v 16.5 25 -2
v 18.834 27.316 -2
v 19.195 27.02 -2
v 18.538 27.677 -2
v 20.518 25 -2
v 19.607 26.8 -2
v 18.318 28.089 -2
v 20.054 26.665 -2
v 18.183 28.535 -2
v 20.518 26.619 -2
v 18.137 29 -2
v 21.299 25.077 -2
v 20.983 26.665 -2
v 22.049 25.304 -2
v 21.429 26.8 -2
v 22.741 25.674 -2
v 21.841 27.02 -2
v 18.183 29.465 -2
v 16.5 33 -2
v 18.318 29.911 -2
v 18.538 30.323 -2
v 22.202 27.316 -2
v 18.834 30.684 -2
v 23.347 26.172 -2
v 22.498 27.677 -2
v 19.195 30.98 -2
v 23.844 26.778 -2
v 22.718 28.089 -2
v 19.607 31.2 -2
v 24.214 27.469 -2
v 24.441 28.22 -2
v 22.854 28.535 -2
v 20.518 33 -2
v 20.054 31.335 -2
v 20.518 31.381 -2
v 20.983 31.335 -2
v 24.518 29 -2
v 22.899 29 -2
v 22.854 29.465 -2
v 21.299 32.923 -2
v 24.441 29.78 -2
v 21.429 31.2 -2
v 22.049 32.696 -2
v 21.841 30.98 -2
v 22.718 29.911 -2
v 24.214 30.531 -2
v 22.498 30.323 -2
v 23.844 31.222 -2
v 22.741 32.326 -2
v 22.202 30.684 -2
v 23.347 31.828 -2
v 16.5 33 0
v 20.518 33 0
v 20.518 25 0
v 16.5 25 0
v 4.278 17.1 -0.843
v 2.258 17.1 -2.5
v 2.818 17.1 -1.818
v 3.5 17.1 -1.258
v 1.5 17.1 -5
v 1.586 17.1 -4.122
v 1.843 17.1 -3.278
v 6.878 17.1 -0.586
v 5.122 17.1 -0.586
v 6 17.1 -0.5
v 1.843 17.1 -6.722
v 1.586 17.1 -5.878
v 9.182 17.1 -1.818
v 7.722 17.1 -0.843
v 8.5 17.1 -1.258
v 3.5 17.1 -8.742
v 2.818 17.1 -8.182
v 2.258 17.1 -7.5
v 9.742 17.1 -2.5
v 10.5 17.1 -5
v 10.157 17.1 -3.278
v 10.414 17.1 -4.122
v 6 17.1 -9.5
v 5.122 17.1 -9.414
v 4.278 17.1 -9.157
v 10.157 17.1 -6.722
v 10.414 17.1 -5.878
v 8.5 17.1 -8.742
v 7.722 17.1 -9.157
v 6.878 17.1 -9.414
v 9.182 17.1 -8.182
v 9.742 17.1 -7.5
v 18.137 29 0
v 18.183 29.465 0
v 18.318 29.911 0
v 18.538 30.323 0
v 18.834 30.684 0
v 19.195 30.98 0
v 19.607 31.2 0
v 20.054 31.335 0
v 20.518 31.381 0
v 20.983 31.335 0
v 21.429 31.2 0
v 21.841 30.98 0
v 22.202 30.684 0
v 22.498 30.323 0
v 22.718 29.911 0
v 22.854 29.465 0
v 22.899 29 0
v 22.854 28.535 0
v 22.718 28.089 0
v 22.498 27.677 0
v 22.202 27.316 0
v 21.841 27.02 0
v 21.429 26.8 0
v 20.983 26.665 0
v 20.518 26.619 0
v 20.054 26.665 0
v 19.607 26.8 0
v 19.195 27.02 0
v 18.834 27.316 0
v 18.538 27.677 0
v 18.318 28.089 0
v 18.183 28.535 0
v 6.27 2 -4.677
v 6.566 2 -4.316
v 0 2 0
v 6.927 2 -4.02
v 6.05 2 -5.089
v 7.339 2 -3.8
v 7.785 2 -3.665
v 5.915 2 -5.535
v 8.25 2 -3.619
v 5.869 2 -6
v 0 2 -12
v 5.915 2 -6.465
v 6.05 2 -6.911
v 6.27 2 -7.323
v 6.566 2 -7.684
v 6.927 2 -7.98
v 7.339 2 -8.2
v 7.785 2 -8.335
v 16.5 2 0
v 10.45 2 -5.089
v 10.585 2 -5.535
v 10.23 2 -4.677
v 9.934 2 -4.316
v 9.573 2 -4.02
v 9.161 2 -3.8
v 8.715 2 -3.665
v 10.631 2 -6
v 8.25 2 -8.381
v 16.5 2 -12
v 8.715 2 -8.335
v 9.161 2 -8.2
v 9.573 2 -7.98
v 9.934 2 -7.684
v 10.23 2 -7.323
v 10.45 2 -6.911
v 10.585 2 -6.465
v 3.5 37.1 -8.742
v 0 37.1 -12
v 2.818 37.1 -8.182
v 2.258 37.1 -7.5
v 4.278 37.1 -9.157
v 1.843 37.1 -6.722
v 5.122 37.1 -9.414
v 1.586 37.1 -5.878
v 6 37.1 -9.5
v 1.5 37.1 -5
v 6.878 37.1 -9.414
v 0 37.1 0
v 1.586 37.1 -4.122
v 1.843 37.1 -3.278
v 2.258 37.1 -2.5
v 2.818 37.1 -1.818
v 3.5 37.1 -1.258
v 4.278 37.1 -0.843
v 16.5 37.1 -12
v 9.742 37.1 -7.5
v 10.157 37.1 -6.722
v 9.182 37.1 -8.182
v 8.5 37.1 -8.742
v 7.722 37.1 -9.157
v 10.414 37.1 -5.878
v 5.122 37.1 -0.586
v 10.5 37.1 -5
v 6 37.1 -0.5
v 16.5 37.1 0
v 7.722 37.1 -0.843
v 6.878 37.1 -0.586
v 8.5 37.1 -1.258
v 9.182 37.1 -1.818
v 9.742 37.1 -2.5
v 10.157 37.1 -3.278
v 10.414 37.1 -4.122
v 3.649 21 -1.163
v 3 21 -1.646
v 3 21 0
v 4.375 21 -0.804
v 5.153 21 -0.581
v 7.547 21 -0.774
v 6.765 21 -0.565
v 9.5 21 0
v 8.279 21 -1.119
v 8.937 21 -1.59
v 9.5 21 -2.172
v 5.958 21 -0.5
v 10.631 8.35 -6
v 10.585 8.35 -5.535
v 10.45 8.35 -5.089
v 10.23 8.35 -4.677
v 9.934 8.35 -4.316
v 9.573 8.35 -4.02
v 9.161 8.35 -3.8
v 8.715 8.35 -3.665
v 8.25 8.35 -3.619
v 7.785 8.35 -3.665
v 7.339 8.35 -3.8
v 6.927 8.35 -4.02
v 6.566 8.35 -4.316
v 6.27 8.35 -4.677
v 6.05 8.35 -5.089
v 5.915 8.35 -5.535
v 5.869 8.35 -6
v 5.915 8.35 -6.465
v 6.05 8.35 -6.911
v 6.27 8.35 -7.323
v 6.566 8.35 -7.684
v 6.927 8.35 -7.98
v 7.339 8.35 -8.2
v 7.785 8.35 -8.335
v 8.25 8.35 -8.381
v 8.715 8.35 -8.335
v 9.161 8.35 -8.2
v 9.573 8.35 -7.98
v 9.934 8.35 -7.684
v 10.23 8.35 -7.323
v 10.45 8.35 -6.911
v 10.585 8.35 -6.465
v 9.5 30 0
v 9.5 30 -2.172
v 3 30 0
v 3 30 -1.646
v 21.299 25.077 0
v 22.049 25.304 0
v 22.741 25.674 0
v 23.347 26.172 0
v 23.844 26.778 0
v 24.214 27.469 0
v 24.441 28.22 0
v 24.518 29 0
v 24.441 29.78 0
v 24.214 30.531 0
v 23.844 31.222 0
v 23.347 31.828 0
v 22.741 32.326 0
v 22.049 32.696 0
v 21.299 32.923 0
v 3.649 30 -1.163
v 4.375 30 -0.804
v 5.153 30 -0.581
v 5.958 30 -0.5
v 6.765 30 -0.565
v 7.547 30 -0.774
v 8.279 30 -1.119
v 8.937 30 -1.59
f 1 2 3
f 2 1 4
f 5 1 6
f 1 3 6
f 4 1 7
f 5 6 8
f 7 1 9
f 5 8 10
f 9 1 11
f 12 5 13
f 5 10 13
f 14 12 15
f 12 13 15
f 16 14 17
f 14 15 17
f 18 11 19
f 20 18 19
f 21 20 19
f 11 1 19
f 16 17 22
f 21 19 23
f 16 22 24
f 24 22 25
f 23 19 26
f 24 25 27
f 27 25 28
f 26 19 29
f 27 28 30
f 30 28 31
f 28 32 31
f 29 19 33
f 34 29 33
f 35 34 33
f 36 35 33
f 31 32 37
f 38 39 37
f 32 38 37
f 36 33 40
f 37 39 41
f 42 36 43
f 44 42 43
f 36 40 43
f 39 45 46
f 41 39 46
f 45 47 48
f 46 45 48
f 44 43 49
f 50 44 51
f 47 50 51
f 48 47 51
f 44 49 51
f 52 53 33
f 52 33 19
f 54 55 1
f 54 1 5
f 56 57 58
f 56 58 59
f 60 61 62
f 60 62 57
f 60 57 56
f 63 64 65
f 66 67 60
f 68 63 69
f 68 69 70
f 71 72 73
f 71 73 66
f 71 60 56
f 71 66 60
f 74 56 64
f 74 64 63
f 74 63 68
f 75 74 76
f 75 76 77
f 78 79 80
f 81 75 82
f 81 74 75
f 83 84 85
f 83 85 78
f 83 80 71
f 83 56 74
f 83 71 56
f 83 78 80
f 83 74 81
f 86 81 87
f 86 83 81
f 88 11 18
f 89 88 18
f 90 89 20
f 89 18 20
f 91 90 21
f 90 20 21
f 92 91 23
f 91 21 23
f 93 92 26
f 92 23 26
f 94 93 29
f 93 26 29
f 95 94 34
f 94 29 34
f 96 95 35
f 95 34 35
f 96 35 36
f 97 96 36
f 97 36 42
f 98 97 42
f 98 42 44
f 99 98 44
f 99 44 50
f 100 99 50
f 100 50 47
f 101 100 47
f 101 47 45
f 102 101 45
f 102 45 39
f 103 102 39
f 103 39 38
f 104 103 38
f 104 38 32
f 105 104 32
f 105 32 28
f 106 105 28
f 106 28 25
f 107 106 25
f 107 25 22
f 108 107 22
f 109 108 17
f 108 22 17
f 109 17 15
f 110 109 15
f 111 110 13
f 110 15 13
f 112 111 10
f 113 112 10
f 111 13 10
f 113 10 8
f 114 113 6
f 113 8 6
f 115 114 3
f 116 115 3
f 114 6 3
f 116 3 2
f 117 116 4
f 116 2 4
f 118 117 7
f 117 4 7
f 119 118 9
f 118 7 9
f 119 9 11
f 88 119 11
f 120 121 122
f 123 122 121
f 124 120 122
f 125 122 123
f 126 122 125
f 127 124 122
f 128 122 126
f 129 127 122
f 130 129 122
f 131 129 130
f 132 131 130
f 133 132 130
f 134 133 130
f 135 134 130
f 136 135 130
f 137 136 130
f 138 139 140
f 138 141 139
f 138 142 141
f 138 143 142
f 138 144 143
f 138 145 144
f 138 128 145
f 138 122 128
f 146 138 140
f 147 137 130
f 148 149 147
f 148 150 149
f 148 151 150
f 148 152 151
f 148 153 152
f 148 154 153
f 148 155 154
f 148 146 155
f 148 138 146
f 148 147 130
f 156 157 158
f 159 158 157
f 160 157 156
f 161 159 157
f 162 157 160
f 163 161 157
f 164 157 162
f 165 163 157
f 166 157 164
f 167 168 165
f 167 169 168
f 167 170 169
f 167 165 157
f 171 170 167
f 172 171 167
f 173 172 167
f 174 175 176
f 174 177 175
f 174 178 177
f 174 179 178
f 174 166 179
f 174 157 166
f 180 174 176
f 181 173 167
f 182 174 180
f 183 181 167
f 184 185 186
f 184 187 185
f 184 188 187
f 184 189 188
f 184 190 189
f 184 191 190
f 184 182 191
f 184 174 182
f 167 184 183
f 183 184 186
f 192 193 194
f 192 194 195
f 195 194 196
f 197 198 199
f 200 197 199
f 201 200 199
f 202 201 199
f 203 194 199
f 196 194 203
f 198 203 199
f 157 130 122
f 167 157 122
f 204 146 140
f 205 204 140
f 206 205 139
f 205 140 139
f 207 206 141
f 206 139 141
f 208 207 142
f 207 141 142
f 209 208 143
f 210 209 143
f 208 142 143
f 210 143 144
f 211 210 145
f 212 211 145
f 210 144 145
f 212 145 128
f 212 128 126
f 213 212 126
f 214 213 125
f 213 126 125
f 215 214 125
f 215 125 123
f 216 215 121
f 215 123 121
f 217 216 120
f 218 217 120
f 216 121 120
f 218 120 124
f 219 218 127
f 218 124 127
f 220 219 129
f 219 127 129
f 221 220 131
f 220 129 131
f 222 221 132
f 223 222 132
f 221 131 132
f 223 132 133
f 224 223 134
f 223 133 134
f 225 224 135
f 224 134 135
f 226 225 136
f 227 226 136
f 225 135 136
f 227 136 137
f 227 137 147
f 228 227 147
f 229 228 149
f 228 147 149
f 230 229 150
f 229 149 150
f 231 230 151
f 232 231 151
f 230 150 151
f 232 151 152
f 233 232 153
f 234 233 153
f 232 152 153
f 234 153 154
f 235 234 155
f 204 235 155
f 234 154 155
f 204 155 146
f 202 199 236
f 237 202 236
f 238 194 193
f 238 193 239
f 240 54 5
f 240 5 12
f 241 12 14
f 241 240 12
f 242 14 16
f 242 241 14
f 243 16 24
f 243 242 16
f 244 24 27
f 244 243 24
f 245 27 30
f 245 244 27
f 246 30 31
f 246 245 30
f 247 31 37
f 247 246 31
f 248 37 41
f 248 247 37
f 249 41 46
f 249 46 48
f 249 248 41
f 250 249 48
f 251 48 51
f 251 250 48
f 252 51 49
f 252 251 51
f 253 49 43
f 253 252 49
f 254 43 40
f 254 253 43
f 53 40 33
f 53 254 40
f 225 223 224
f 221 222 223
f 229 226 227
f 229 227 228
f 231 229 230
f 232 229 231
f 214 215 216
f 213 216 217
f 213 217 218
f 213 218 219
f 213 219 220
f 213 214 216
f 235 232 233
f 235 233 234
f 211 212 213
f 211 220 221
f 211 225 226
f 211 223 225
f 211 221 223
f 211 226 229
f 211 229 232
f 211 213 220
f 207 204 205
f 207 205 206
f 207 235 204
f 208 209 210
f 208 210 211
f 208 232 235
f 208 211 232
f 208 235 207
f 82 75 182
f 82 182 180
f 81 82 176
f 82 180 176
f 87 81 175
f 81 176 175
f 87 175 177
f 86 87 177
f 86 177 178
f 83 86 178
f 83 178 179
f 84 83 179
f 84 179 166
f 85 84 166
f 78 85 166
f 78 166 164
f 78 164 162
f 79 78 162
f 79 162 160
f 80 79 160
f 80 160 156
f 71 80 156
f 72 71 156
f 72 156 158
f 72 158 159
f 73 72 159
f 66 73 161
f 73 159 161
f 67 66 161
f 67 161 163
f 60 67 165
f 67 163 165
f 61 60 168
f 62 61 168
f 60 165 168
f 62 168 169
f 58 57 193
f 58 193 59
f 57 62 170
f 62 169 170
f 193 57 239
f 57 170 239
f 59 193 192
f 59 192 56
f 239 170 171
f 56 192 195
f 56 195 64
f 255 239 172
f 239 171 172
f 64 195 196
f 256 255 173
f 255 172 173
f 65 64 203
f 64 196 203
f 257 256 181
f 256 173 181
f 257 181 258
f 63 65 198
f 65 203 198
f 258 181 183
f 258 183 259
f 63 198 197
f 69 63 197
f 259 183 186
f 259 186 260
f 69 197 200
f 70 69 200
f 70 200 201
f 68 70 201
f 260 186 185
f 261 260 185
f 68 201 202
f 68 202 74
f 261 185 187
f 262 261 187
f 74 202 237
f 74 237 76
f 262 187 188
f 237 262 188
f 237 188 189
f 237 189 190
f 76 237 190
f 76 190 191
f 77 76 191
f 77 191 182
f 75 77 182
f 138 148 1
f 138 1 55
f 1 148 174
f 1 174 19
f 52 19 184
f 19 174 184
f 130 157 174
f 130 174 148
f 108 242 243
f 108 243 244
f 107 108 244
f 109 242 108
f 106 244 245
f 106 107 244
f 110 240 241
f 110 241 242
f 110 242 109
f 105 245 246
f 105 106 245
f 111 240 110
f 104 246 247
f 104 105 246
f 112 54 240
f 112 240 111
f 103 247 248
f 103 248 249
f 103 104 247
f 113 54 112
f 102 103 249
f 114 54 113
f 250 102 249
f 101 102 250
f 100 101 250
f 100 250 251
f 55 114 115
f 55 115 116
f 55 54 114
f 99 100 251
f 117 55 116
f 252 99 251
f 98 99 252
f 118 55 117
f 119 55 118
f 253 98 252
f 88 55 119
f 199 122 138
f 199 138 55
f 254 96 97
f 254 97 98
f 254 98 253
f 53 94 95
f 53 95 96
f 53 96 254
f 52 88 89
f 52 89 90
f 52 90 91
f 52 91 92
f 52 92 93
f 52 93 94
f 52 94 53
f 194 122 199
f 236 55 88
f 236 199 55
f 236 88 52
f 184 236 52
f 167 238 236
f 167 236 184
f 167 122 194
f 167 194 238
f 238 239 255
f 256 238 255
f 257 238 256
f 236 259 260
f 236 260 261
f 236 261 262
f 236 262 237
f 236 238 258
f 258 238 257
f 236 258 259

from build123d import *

# Parameters (mm, degrees)
BOSS_EXTRUDE4_DEPTH = 16.5
CUT_EXTRUDE2_DEPTH  = 1.5
CUT_EXTRUDE4_DEPTH  = 17.5
SKETCH6_W           = 12
SKETCH6_H           = 2
CUT_EXTRUDE5_DEPTH  = 17.5
BOSS_EXTRUDE5_DEPTH = 2
SKETCH10_R          = 2.38125
CUT_EXTRUDE6_DEPTH  = 13.606601718
CUT_EXTRUDE7_DEPTH  = 17.5
SKETCH12_R          = 2.38125
CUT_EXTRUDE8_DEPTH  = 6.35
SKETCH13_R          = 4.5
CUT_EXTRUDE13_DEPTH = 20
SKETCH14_W          = 6.5
SKETCH14_H          = 9
CUT_EXTRUDE14_DEPTH = 6


with BuildPart() as part:
    # Sketch1 → Boss-Extrude4 (new body)
    with BuildSketch(Plane(origin=(0, 0, 0), x_dir=(0, 0, -1), z_dir=(1, 0, 0))):
        Polygon((0, 0), (0, 37.1), (-10.606601718, 47.706601718), (12, 47.706601718), (12, 0), align=None)
    extrude(amount=BOSS_EXTRUDE4_DEPTH)

    # Sketch4 → Cut-Extrude2 (cut)
    with BuildSketch(Plane.ZY):
        Polygon((0, 37.1), (0, 47.706601718), (10.606601718, 47.706601718), align=None)
    extrude(amount=-CUT_EXTRUDE2_DEPTH, mode=Mode.SUBTRACT)

    # Sketch5 → Cut-Extrude4 (cut, through all)
    with BuildSketch(Plane(origin=(16.5, 0, 0), x_dir=(0, 0, -1), z_dir=(1, 0, 0))):
        Polygon((-3.566952421, 40.666952421), (-2.859845639, 39.959845639), (-1.799185468, 41.020505811), (0, 39.221320344), (0, 42.756854249), (-2.683068944, 45.439923194), (-4.450835897, 43.672156241), (-3.036622335, 42.257942678), (-4.097282506, 41.197282506), align=None)
    extrude(amount=-CUT_EXTRUDE4_DEPTH, mode=Mode.SUBTRACT)

    # Sketch6 → Cut-Extrude5 (cut, through all)
    with BuildSketch(Plane(origin=(16.5, 0, 0), x_dir=(0, 0, -1), z_dir=(1, 0, 0))):
        with Locations((6, 1)):
            Rectangle(SKETCH6_W, SKETCH6_H)
    extrude(amount=-CUT_EXTRUDE5_DEPTH, mode=Mode.SUBTRACT)

    # Sketch9 → Boss-Extrude5 (add)
    with BuildSketch(Plane.XY):
        with BuildLine():
            Line((16.5, 29), (16.5, 25))
            Line((16.5, 25), (20.518219338, 25))
            ThreePointArc((20.518219338, 25), (24.518219338, 29), (20.518219338, 33))
            Line((20.518219338, 33), (16.5, 33))
            Line((16.5, 33), (16.5, 29))
        make_face()
    extrude(amount=-BOSS_EXTRUDE5_DEPTH)

    # Sketch10 → Cut-Extrude6 (cut, through all)
    with BuildSketch(Plane(origin=(0, 0, -2), x_dir=(-1, 0, 0), z_dir=(0, 0, -1))):
        with Locations((-20.518219338, 29)):
            Circle(SKETCH10_R)
    extrude(amount=-CUT_EXTRUDE6_DEPTH, mode=Mode.SUBTRACT)

    # Sketch11 → Cut-Extrude7 (cut, through all)
    with BuildSketch(Plane(origin=(16.5, 0, 0), x_dir=(0, 0, -1), z_dir=(1, 0, 0))):
        Polygon((0, 37.1), (-10.606601718, 47.706601718), (12, 47.706601718), (12, 37.1), align=None)
    extrude(amount=-CUT_EXTRUDE7_DEPTH, mode=Mode.SUBTRACT)

    # Sketch12 → Cut-Extrude8 (cut)
    with BuildSketch(Plane.XZ.offset(-2)):
        with Locations((8.25, -6)):
            Circle(SKETCH12_R)
    extrude(amount=-CUT_EXTRUDE8_DEPTH, mode=Mode.SUBTRACT)

    # Sketch13 → Cut-Extrude13 (cut)
    with BuildSketch(Plane(origin=(0, 37.1, 0), x_dir=(1, 0, 0), z_dir=(0, 1, 0))):
        with Locations((6, 5)):
            Circle(SKETCH13_R)
    extrude(amount=-CUT_EXTRUDE13_DEPTH, mode=Mode.SUBTRACT)

    # Sketch14 → Cut-Extrude14 (cut)
    with BuildSketch(Plane.XY):
        with Locations((6.25, 25.5)):
            Rectangle(SKETCH14_W, SKETCH14_H)
    extrude(amount=-CUT_EXTRUDE14_DEPTH, mode=Mode.SUBTRACT)


solid = part.part
